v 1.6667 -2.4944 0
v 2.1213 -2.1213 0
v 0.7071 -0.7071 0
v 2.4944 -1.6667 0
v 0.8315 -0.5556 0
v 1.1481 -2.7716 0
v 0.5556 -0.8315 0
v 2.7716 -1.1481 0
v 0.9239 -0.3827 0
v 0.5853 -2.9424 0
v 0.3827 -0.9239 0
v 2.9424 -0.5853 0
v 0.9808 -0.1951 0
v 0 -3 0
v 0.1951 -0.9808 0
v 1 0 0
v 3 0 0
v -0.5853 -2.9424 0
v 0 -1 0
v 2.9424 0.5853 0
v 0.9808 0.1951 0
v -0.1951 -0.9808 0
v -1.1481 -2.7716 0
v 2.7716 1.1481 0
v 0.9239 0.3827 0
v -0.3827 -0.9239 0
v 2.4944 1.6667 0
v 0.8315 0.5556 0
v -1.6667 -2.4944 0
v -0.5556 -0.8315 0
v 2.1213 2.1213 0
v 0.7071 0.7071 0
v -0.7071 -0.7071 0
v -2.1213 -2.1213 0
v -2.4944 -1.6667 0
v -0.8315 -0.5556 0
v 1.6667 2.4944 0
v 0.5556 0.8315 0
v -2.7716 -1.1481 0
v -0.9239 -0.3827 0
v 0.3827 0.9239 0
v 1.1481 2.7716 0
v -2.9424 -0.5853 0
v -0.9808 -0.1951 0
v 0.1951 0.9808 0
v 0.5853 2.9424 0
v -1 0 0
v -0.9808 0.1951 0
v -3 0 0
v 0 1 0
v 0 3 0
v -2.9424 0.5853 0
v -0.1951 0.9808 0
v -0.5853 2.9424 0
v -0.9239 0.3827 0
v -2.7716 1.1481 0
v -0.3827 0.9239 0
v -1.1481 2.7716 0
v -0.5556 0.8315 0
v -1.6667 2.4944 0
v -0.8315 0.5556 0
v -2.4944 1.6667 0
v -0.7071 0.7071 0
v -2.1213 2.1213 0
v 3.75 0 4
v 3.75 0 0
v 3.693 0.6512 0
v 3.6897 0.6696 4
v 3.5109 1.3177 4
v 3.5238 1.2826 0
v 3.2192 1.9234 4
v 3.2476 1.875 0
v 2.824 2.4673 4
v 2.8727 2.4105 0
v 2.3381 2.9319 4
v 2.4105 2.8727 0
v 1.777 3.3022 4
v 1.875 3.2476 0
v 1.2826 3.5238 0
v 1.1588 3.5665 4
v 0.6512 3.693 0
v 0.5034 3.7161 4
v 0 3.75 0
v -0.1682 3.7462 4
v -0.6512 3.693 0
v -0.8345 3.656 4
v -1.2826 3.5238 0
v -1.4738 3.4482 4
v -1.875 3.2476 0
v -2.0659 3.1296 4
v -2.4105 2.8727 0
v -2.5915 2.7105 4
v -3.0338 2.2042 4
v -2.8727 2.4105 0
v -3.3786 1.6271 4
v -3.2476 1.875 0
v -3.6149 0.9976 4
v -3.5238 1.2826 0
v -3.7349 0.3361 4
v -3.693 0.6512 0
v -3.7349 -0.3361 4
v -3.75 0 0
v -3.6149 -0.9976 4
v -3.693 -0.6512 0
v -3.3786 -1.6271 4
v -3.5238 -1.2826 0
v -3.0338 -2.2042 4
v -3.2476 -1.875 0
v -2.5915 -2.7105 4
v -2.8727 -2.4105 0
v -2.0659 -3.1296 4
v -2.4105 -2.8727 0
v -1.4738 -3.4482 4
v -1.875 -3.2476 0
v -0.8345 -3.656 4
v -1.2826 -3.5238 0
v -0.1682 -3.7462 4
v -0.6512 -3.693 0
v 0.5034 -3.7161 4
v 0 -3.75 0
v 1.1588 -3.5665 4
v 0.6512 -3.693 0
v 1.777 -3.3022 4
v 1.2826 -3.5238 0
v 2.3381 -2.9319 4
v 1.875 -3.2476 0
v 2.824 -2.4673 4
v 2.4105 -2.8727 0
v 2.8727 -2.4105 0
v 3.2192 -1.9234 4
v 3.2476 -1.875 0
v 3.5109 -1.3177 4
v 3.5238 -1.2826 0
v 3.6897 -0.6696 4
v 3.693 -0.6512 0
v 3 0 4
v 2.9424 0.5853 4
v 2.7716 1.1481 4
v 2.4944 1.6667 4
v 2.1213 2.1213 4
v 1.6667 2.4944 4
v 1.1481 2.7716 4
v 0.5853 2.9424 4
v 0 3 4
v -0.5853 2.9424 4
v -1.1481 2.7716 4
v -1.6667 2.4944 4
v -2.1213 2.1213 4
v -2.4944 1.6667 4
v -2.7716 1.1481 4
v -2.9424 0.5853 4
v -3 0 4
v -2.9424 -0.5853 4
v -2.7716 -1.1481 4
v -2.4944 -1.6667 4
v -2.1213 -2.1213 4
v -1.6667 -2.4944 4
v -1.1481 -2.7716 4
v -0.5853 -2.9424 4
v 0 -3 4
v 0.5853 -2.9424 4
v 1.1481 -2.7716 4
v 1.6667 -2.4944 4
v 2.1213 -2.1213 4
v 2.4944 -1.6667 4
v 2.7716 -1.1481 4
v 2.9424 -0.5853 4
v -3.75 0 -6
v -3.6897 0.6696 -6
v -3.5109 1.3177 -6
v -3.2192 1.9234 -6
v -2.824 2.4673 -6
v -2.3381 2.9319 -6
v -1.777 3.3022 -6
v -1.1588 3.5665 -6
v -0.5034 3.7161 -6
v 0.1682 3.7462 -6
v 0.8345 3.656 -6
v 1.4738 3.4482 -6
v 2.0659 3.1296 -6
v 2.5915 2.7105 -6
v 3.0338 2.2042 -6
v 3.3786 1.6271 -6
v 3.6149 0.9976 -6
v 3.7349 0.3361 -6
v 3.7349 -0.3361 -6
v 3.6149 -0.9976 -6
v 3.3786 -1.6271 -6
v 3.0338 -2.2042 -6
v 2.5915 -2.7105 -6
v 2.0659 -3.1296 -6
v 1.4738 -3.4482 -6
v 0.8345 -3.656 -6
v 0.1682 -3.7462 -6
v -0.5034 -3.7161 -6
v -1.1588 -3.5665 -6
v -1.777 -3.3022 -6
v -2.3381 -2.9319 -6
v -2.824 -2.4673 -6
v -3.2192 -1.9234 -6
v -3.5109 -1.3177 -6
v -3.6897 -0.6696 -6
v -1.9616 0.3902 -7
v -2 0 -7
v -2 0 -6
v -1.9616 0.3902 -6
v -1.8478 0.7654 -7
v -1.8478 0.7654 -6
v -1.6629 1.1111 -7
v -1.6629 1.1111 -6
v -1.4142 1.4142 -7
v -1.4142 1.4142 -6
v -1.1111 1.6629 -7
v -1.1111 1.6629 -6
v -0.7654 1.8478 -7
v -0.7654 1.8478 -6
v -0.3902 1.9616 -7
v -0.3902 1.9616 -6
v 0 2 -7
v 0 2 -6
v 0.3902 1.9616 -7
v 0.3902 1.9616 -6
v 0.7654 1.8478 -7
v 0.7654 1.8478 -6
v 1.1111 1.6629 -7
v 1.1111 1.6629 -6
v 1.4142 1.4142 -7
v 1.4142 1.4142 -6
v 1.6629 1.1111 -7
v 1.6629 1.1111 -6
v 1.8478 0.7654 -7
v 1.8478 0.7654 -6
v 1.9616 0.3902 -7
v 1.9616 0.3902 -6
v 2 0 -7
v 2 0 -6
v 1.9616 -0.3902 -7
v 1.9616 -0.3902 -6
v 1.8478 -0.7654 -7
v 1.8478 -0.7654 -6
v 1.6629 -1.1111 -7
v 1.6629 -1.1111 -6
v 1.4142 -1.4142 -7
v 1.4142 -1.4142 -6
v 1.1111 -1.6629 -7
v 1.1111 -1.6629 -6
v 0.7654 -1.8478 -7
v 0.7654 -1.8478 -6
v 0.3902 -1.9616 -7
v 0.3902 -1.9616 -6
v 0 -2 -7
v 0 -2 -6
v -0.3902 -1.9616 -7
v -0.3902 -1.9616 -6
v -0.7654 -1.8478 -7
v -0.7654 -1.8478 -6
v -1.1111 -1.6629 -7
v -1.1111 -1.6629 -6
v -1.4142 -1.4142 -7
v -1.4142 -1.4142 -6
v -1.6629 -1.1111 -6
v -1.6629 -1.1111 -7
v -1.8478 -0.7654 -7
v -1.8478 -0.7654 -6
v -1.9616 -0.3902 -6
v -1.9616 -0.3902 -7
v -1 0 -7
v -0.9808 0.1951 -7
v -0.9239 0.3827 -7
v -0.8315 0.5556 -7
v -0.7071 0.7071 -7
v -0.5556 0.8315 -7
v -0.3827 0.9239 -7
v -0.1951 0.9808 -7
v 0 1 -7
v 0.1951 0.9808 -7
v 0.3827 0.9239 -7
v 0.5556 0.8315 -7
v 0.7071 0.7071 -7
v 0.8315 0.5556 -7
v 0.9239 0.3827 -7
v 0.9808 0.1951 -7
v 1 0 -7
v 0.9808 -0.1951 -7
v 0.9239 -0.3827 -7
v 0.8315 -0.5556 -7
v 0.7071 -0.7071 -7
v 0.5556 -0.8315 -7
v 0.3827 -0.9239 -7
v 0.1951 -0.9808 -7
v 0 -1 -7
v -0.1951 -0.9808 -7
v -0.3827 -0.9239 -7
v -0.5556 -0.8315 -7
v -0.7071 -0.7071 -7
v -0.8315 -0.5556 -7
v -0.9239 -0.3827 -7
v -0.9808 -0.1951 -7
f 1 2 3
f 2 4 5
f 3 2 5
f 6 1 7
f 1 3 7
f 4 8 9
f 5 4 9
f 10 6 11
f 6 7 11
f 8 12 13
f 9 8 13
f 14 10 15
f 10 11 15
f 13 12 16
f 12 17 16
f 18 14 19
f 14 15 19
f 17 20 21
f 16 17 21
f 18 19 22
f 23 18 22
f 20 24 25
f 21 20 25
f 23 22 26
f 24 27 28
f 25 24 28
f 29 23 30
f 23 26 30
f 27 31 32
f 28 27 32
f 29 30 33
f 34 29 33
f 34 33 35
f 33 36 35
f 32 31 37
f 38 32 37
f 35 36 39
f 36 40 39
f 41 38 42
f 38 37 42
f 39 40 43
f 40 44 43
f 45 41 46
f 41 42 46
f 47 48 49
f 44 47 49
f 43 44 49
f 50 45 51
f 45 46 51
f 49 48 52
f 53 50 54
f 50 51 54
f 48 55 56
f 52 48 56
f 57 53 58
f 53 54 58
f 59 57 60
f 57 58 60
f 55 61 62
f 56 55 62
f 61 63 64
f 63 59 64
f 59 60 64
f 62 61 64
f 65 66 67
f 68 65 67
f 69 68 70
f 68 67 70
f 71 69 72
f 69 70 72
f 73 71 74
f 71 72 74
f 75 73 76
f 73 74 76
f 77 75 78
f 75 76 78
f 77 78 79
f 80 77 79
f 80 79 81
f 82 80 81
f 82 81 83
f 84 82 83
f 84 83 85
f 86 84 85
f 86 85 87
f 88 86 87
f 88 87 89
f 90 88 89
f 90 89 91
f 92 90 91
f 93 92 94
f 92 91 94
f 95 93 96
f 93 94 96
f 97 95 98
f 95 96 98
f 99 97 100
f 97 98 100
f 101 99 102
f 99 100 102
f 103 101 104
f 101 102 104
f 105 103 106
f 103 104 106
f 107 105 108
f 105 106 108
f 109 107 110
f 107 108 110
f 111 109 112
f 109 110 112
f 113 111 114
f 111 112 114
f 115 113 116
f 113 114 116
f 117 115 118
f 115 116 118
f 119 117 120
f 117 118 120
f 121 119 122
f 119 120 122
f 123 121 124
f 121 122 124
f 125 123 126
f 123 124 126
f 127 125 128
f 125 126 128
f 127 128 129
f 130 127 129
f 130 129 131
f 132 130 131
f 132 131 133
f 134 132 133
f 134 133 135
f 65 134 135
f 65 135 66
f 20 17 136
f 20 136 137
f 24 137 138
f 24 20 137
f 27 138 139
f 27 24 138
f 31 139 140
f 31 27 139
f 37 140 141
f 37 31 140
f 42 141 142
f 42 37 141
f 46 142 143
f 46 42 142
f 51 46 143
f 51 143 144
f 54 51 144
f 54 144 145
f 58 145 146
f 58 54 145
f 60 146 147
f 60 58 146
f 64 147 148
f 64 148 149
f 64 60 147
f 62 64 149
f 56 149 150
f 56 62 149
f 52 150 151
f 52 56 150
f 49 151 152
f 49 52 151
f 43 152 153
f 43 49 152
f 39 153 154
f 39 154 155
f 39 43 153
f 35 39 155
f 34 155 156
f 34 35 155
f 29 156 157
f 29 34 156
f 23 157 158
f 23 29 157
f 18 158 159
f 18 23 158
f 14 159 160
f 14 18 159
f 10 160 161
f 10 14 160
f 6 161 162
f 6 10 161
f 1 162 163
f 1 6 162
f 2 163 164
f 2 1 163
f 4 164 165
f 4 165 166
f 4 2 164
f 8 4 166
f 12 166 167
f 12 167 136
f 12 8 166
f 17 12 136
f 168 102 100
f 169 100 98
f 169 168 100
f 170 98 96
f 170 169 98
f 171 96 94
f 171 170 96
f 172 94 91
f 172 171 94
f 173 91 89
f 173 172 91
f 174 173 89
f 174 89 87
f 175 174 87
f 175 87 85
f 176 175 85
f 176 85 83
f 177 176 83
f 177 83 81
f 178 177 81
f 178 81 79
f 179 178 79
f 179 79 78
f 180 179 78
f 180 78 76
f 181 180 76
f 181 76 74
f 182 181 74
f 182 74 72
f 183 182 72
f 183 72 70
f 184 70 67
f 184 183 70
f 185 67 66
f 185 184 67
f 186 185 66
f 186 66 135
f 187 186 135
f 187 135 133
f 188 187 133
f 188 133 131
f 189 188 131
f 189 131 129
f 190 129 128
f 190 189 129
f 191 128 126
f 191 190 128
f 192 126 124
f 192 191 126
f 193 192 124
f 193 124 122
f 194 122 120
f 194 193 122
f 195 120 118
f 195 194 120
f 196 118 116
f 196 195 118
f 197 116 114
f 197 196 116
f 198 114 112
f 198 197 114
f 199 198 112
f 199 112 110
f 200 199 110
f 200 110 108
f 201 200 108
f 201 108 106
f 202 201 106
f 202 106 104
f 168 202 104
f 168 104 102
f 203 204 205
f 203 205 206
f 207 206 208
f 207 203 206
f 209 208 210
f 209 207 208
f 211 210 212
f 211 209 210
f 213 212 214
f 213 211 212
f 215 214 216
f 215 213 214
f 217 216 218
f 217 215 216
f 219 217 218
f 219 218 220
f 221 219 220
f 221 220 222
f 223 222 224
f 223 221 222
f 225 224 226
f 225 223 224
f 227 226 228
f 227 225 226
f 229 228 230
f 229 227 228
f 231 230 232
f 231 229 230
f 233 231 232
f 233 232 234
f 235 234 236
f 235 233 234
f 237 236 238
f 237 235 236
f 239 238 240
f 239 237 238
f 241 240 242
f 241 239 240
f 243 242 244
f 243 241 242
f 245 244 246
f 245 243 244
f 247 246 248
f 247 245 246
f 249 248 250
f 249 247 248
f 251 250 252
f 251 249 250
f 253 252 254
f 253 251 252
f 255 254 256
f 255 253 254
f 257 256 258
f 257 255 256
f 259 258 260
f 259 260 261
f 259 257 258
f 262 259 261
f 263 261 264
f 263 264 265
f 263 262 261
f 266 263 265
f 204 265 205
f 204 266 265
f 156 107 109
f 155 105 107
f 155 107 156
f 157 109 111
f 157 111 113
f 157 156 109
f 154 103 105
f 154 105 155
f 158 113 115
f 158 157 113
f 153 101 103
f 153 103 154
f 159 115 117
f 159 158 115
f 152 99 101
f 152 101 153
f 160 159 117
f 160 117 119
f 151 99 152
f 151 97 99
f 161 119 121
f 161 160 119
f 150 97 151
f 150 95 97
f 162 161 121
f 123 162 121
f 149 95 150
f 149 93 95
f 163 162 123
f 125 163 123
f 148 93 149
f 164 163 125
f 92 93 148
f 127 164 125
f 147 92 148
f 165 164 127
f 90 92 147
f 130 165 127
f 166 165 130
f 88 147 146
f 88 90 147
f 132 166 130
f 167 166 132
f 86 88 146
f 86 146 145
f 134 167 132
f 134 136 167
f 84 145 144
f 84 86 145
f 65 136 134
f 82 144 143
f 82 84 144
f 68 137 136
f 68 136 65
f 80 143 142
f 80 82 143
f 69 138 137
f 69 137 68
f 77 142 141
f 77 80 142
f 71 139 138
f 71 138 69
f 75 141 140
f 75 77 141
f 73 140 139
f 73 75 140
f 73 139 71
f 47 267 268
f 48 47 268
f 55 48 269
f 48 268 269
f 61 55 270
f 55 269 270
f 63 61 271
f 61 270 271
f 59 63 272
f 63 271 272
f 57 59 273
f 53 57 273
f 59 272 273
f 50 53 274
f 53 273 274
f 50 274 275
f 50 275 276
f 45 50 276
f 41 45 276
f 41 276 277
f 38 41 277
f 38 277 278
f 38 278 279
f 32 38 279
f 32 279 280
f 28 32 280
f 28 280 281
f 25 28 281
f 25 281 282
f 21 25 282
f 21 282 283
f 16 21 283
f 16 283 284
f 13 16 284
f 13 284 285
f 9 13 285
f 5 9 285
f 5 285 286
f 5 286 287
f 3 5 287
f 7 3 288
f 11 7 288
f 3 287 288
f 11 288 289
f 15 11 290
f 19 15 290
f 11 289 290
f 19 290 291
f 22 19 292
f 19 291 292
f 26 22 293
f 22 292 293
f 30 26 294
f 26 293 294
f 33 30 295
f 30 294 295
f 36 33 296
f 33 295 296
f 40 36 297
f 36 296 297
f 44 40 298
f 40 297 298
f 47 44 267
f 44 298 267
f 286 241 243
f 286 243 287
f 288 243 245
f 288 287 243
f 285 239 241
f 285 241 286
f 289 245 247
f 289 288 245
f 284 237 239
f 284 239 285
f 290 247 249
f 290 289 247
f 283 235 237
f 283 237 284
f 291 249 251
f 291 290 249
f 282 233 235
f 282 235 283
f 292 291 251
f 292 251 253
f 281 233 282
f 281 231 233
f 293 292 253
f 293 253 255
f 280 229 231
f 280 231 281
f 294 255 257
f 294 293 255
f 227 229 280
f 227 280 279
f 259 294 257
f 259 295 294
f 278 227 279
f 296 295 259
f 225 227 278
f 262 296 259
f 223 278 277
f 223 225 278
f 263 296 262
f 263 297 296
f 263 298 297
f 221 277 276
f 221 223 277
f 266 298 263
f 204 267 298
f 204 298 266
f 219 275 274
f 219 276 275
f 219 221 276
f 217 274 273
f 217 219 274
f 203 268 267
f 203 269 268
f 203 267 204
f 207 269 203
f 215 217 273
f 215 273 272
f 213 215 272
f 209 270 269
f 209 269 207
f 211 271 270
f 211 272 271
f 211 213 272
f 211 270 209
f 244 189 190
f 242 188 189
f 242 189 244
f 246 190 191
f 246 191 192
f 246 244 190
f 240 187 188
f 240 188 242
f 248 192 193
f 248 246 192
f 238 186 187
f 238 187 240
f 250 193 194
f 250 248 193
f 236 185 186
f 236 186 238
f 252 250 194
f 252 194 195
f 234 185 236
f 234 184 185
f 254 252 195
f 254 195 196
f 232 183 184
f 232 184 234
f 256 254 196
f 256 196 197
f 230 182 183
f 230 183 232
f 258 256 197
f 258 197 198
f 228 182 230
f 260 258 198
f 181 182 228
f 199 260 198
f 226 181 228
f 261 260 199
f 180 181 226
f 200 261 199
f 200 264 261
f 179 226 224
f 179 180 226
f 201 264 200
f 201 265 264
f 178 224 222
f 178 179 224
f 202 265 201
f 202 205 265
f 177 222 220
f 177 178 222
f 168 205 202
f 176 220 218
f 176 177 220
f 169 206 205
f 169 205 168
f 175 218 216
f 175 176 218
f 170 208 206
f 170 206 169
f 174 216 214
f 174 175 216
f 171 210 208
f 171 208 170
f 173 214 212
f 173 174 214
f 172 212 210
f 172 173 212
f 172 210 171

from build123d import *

# Parameters (mm, degrees)
SKETCH1_R           = 3.75
SKETCH1_R_2         = 3
BOSS_EXTRUDE1_DEPTH = 4
BOSS_EXTRUDE2_START = 6
SKETCH2_R           = 3.75
SKETCH2_R_2         = 1
BOSS_EXTRUDE2_DEPTH = 6
BOSS_EXTRUDE3_START = 1
SKETCH3_R           = 2
SKETCH3_R_2         = 1
BOSS_EXTRUDE3_DEPTH = 1


with BuildPart() as part:
    # Sketch1 → Boss-Extrude1 (new body)
    with BuildSketch(Plane.XY):
        Circle(SKETCH1_R)
        Circle(SKETCH1_R_2, mode=Mode.SUBTRACT)
    extrude(amount=BOSS_EXTRUDE1_DEPTH)

    # Sketch2 → Boss-Extrude2 (add)
    with BuildSketch(Plane(origin=(0, 0, 0), x_dir=(-1, 0, 0), z_dir=(0, 0, -1)).offset(BOSS_EXTRUDE2_START)):
        Circle(SKETCH2_R)
        Circle(SKETCH2_R_2, mode=Mode.SUBTRACT)
    extrude(amount=-BOSS_EXTRUDE2_DEPTH)

    # Sketch3 → Boss-Extrude3 (add)
    with BuildSketch(Plane(origin=(0, 0, -6), x_dir=(-1, 0, 0), z_dir=(0, 0, -1)).offset(BOSS_EXTRUDE3_START)):
        Circle(SKETCH3_R)
        Circle(SKETCH3_R_2, mode=Mode.SUBTRACT)
    extrude(amount=-BOSS_EXTRUDE3_DEPTH)


solid = part.part
